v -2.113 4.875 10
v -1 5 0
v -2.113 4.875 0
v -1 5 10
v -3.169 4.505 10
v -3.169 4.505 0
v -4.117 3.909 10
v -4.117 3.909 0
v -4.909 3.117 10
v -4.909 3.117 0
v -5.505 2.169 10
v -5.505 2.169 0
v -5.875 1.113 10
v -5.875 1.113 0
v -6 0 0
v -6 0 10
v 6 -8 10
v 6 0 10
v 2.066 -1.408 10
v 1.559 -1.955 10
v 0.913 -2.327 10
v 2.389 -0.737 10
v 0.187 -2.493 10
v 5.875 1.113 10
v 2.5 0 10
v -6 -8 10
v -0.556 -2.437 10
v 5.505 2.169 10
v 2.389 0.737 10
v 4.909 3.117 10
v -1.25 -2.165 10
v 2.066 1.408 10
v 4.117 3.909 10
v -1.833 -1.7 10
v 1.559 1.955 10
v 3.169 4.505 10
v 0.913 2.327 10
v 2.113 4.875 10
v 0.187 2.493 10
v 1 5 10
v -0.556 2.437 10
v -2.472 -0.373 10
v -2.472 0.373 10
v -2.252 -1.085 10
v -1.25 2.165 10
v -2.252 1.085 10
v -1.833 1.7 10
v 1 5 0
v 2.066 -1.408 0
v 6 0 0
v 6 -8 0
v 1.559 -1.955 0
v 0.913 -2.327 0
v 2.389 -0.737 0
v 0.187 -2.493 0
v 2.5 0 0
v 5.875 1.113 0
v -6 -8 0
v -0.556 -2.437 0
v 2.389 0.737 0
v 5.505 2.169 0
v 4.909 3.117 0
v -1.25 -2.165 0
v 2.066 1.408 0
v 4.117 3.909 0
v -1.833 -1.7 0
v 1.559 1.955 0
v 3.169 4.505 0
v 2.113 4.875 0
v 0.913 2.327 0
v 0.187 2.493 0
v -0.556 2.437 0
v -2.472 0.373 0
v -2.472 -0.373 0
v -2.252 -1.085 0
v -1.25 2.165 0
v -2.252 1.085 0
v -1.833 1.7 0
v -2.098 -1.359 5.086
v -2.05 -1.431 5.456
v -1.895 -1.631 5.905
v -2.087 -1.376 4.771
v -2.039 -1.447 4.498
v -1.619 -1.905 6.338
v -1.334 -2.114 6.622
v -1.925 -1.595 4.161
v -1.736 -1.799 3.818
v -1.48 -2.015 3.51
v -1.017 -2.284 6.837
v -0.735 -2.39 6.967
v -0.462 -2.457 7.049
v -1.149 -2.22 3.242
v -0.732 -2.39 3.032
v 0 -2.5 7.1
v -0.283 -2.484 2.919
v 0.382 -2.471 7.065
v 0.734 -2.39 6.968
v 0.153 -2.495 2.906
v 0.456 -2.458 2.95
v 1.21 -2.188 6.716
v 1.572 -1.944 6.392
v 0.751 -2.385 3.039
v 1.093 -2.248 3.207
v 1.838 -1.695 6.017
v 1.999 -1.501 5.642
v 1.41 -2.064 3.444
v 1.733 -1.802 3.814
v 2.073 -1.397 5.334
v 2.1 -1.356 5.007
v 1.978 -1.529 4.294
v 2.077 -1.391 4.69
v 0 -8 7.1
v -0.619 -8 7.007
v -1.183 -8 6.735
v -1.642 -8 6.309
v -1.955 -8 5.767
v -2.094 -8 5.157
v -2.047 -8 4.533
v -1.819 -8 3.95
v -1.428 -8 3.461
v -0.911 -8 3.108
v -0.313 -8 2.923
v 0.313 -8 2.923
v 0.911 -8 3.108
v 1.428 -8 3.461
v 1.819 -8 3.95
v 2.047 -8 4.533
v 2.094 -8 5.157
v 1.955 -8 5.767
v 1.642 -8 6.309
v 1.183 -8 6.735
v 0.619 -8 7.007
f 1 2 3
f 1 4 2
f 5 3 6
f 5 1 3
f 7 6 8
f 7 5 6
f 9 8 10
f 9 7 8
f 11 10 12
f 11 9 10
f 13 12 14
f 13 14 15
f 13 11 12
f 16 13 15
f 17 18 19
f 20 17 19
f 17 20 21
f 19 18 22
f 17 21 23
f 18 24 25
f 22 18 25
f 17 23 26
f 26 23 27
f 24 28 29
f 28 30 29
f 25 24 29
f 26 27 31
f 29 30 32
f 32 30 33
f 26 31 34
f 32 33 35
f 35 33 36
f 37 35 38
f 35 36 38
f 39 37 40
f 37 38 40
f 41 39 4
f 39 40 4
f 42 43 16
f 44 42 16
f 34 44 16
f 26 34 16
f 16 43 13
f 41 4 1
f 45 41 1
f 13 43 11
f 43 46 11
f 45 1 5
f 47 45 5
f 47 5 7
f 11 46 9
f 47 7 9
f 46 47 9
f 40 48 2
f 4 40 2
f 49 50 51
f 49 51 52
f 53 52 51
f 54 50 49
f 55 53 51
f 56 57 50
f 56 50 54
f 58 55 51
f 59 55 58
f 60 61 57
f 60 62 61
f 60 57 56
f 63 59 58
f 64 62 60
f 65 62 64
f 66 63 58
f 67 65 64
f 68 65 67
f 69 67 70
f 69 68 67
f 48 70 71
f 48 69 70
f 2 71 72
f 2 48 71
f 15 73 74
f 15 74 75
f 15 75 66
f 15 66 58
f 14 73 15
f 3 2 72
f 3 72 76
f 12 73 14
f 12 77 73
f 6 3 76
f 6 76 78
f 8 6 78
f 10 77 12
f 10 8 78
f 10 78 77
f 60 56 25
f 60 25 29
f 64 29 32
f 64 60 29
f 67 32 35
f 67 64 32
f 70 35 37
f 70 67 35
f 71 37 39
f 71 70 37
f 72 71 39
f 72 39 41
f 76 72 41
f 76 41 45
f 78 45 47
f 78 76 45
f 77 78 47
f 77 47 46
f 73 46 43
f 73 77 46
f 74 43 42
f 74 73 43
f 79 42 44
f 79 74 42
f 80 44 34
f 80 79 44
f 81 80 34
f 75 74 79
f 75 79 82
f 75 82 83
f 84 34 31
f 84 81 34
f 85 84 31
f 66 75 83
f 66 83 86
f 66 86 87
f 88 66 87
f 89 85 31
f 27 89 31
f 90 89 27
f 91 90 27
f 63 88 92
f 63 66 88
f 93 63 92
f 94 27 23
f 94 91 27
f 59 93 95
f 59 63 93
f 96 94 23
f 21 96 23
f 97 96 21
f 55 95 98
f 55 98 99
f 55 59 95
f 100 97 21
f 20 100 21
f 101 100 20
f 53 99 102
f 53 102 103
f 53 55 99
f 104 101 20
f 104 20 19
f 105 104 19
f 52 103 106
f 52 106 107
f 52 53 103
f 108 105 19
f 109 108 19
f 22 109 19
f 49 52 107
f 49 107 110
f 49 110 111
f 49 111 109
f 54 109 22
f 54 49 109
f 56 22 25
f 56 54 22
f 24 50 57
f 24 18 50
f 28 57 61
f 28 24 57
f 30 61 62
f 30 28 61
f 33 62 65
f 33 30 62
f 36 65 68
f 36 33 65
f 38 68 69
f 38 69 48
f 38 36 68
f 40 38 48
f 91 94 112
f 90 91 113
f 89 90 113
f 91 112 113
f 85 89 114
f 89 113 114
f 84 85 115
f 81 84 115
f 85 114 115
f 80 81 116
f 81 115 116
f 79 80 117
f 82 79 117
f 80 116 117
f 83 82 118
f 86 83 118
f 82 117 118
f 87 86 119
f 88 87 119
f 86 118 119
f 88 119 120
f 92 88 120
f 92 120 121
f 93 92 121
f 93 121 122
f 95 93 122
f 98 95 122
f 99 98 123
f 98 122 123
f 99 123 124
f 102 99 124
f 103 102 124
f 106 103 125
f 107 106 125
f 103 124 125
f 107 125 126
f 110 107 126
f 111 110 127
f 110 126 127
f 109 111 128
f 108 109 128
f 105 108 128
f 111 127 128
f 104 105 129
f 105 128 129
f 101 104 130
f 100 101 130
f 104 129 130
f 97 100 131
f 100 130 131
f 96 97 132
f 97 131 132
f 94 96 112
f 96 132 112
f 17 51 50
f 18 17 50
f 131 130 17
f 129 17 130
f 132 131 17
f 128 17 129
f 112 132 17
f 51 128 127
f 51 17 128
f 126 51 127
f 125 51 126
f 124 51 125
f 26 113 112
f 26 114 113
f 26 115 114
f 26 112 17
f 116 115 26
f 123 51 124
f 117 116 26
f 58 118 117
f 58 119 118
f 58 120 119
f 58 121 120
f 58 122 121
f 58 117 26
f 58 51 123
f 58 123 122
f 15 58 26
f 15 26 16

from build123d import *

# Parameters (mm, degrees)
ESQUISSE1_W        = 12
ESQUISSE1_H        = 13
BOSS_EXTRU_1_DEPTH = 10
ESQUISSE3_W        = 2.5
ESQUISSE3_H        = 10
ESQUISSE4_W        = 2.1
ESQUISSE4_H        = 8
CONG_1_R           = 5


with BuildPart() as part:
    # Esquisse1 → Boss.-Extru.1 (new body)
    with BuildSketch(Plane(origin=(0, 0, 0), x_dir=(-1, 0, 0), z_dir=(0, 0, -1))):
        with Locations((0, -1.5)):
            Rectangle(ESQUISSE1_W, ESQUISSE1_H)
    extrude(amount=-BOSS_EXTRU_1_DEPTH)

    # Esquisse3 → Enlèvement de matière-Révolution1 (revolve, cut)
    with BuildSketch(Plane(origin=(0, 0, 0), x_dir=(1, 0, 0), z_dir=(0, 1, 0))):
        with Locations((1.25, -5)):
            Rectangle(ESQUISSE3_W, ESQUISSE3_H)
    revolve(axis=Axis((0, 0, 0), (0, 0, 1)), mode=Mode.SUBTRACT)

    # Esquisse4 → Diamètre du perçage Ø5.6 (5.6)1 (revolve, cut)
    with BuildSketch(Plane(origin=(0, 0, 5), x_dir=(0, 0, 1), z_dir=(1, 0, 0))):
        with Locations((1.05, 4)):
            Rectangle(ESQUISSE4_W, ESQUISSE4_H)
    revolve(axis=Axis((0, 6.35, 5), (0, -1, 0)), mode=Mode.SUBTRACT)

    # Congé1
    cong_1_edges = [part.edges().sort_by_distance(p)[0] for p in [
        (6, 5, 5),
        (-6, 5, 5),
    ]]
    fillet(cong_1_edges, radius=CONG_1_R)


solid = part.part
